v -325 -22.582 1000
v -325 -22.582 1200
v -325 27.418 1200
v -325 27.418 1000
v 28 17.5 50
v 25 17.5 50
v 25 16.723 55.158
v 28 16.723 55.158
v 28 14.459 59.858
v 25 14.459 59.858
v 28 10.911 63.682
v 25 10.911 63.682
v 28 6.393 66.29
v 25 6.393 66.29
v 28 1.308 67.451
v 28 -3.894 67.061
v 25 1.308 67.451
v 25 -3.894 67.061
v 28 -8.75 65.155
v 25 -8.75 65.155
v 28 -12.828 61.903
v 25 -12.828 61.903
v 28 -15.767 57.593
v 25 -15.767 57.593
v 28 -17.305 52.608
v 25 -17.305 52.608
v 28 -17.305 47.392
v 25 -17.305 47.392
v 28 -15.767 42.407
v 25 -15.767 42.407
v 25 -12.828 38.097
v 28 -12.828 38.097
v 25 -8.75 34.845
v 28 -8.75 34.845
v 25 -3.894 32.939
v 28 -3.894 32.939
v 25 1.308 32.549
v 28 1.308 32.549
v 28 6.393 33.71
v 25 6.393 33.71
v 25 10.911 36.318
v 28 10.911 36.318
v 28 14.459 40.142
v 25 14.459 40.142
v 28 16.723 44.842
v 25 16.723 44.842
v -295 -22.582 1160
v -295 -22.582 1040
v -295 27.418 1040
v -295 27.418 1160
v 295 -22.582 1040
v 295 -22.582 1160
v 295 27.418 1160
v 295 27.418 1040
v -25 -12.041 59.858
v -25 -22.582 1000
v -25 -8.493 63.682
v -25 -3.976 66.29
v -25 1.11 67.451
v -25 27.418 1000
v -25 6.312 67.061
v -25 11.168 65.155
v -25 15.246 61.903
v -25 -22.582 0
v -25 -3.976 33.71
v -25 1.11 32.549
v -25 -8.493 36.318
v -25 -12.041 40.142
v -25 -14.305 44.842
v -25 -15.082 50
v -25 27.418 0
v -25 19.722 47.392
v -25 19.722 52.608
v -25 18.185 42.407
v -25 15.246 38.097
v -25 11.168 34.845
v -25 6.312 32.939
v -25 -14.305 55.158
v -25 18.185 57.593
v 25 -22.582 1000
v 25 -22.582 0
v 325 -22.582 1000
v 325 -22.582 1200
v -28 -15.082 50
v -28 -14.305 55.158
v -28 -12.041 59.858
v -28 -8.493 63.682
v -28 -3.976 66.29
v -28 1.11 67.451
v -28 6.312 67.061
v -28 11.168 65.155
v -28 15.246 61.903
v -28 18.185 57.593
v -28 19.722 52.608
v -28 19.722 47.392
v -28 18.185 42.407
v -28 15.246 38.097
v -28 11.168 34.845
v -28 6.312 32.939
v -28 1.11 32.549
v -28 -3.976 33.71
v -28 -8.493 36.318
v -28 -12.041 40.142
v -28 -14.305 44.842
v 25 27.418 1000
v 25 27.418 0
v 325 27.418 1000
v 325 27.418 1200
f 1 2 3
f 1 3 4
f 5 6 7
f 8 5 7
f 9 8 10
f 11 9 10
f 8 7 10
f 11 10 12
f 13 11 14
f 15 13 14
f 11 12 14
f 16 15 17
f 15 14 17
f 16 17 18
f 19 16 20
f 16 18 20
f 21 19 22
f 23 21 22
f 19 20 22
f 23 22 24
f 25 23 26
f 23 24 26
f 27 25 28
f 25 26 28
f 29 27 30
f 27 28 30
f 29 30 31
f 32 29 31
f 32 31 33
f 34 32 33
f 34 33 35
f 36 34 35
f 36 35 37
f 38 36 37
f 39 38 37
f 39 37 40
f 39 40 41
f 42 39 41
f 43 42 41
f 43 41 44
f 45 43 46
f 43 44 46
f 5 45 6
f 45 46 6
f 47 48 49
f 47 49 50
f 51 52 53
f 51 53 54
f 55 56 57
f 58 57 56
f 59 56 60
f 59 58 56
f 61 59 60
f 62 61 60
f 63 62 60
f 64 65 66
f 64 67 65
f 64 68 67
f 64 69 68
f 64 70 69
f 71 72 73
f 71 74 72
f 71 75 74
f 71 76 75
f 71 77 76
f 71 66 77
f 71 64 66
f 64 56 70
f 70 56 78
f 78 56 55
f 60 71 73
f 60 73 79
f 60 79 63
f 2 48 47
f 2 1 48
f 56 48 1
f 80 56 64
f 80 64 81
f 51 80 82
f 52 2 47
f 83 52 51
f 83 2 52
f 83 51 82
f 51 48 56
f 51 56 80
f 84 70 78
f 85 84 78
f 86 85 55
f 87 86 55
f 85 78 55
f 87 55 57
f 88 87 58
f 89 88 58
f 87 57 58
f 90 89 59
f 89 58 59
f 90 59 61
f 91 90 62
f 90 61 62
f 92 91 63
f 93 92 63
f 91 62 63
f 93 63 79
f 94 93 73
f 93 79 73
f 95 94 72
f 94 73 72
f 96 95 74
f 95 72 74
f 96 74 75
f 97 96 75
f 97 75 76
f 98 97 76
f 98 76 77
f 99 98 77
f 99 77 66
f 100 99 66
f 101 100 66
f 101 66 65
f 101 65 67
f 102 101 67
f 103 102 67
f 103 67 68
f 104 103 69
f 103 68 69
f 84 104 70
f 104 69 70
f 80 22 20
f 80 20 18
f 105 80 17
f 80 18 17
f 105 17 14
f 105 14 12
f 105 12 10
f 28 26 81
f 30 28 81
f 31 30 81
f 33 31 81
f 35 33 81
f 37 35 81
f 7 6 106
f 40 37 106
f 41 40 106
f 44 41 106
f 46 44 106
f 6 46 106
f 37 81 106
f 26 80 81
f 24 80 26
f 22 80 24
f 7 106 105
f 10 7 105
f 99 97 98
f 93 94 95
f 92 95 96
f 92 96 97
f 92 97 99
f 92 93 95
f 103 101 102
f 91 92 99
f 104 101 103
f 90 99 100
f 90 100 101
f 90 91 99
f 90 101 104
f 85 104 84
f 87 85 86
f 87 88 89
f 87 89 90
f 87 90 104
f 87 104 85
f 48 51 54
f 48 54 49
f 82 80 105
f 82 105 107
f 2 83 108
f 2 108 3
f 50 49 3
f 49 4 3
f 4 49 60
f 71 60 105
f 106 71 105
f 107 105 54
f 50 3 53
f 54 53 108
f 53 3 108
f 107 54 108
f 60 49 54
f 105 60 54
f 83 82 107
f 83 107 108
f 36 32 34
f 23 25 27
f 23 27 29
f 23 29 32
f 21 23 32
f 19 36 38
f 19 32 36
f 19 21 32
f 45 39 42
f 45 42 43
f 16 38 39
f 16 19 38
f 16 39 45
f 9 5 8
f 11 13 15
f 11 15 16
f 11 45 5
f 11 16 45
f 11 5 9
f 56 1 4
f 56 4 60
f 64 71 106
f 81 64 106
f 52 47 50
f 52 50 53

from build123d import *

# Parameters (mm, degrees)
F0_W     = 50
F0_H     = 50
F1_DEPTH = 1000
F3_DEPTH = 50
F4_R     = 17.5
F5_DEPTH = 3
F6_R     = 17.5
F7_DEPTH = 3


with BuildPart() as f1:
    # F0 (on Top) → F1 (new body)
    with BuildSketch(Plane.XY):
        with Locations((0, 2.417763)):
            Rectangle(F0_W, F0_H)
    extrude(amount=F1_DEPTH)

    # F2 (on face) → F3 (join)
    with BuildSketch(Plane.XZ.offset(22.582237)):
        Polygon((-25, 1000), (25, 1000), (325, 1000), (325, 1200), (-325, 1200), (-325, 1000), align=None)
        Polygon((25, 1040), (-295, 1040), (-295, 1160), (295, 1160), (295, 1040), align=None, mode=Mode.SUBTRACT)
    extrude(amount=-F3_DEPTH)

    # F4 (on face) → F5 (join)
    with BuildSketch(Plane.YZ.offset(25)):
        with Locations((0, 50)):
            Circle(F4_R)
    extrude(amount=F5_DEPTH)

    # F6 (on face) → F7 (join)
    with BuildSketch(Plane(origin=(-25, 0, 0), x_dir=(0, -1, 0), z_dir=(-1, 0, 0))):
        with Locations((-2.417763, 50)):
            Circle(F6_R)
    extrude(amount=F7_DEPTH)


solid = f1.part
